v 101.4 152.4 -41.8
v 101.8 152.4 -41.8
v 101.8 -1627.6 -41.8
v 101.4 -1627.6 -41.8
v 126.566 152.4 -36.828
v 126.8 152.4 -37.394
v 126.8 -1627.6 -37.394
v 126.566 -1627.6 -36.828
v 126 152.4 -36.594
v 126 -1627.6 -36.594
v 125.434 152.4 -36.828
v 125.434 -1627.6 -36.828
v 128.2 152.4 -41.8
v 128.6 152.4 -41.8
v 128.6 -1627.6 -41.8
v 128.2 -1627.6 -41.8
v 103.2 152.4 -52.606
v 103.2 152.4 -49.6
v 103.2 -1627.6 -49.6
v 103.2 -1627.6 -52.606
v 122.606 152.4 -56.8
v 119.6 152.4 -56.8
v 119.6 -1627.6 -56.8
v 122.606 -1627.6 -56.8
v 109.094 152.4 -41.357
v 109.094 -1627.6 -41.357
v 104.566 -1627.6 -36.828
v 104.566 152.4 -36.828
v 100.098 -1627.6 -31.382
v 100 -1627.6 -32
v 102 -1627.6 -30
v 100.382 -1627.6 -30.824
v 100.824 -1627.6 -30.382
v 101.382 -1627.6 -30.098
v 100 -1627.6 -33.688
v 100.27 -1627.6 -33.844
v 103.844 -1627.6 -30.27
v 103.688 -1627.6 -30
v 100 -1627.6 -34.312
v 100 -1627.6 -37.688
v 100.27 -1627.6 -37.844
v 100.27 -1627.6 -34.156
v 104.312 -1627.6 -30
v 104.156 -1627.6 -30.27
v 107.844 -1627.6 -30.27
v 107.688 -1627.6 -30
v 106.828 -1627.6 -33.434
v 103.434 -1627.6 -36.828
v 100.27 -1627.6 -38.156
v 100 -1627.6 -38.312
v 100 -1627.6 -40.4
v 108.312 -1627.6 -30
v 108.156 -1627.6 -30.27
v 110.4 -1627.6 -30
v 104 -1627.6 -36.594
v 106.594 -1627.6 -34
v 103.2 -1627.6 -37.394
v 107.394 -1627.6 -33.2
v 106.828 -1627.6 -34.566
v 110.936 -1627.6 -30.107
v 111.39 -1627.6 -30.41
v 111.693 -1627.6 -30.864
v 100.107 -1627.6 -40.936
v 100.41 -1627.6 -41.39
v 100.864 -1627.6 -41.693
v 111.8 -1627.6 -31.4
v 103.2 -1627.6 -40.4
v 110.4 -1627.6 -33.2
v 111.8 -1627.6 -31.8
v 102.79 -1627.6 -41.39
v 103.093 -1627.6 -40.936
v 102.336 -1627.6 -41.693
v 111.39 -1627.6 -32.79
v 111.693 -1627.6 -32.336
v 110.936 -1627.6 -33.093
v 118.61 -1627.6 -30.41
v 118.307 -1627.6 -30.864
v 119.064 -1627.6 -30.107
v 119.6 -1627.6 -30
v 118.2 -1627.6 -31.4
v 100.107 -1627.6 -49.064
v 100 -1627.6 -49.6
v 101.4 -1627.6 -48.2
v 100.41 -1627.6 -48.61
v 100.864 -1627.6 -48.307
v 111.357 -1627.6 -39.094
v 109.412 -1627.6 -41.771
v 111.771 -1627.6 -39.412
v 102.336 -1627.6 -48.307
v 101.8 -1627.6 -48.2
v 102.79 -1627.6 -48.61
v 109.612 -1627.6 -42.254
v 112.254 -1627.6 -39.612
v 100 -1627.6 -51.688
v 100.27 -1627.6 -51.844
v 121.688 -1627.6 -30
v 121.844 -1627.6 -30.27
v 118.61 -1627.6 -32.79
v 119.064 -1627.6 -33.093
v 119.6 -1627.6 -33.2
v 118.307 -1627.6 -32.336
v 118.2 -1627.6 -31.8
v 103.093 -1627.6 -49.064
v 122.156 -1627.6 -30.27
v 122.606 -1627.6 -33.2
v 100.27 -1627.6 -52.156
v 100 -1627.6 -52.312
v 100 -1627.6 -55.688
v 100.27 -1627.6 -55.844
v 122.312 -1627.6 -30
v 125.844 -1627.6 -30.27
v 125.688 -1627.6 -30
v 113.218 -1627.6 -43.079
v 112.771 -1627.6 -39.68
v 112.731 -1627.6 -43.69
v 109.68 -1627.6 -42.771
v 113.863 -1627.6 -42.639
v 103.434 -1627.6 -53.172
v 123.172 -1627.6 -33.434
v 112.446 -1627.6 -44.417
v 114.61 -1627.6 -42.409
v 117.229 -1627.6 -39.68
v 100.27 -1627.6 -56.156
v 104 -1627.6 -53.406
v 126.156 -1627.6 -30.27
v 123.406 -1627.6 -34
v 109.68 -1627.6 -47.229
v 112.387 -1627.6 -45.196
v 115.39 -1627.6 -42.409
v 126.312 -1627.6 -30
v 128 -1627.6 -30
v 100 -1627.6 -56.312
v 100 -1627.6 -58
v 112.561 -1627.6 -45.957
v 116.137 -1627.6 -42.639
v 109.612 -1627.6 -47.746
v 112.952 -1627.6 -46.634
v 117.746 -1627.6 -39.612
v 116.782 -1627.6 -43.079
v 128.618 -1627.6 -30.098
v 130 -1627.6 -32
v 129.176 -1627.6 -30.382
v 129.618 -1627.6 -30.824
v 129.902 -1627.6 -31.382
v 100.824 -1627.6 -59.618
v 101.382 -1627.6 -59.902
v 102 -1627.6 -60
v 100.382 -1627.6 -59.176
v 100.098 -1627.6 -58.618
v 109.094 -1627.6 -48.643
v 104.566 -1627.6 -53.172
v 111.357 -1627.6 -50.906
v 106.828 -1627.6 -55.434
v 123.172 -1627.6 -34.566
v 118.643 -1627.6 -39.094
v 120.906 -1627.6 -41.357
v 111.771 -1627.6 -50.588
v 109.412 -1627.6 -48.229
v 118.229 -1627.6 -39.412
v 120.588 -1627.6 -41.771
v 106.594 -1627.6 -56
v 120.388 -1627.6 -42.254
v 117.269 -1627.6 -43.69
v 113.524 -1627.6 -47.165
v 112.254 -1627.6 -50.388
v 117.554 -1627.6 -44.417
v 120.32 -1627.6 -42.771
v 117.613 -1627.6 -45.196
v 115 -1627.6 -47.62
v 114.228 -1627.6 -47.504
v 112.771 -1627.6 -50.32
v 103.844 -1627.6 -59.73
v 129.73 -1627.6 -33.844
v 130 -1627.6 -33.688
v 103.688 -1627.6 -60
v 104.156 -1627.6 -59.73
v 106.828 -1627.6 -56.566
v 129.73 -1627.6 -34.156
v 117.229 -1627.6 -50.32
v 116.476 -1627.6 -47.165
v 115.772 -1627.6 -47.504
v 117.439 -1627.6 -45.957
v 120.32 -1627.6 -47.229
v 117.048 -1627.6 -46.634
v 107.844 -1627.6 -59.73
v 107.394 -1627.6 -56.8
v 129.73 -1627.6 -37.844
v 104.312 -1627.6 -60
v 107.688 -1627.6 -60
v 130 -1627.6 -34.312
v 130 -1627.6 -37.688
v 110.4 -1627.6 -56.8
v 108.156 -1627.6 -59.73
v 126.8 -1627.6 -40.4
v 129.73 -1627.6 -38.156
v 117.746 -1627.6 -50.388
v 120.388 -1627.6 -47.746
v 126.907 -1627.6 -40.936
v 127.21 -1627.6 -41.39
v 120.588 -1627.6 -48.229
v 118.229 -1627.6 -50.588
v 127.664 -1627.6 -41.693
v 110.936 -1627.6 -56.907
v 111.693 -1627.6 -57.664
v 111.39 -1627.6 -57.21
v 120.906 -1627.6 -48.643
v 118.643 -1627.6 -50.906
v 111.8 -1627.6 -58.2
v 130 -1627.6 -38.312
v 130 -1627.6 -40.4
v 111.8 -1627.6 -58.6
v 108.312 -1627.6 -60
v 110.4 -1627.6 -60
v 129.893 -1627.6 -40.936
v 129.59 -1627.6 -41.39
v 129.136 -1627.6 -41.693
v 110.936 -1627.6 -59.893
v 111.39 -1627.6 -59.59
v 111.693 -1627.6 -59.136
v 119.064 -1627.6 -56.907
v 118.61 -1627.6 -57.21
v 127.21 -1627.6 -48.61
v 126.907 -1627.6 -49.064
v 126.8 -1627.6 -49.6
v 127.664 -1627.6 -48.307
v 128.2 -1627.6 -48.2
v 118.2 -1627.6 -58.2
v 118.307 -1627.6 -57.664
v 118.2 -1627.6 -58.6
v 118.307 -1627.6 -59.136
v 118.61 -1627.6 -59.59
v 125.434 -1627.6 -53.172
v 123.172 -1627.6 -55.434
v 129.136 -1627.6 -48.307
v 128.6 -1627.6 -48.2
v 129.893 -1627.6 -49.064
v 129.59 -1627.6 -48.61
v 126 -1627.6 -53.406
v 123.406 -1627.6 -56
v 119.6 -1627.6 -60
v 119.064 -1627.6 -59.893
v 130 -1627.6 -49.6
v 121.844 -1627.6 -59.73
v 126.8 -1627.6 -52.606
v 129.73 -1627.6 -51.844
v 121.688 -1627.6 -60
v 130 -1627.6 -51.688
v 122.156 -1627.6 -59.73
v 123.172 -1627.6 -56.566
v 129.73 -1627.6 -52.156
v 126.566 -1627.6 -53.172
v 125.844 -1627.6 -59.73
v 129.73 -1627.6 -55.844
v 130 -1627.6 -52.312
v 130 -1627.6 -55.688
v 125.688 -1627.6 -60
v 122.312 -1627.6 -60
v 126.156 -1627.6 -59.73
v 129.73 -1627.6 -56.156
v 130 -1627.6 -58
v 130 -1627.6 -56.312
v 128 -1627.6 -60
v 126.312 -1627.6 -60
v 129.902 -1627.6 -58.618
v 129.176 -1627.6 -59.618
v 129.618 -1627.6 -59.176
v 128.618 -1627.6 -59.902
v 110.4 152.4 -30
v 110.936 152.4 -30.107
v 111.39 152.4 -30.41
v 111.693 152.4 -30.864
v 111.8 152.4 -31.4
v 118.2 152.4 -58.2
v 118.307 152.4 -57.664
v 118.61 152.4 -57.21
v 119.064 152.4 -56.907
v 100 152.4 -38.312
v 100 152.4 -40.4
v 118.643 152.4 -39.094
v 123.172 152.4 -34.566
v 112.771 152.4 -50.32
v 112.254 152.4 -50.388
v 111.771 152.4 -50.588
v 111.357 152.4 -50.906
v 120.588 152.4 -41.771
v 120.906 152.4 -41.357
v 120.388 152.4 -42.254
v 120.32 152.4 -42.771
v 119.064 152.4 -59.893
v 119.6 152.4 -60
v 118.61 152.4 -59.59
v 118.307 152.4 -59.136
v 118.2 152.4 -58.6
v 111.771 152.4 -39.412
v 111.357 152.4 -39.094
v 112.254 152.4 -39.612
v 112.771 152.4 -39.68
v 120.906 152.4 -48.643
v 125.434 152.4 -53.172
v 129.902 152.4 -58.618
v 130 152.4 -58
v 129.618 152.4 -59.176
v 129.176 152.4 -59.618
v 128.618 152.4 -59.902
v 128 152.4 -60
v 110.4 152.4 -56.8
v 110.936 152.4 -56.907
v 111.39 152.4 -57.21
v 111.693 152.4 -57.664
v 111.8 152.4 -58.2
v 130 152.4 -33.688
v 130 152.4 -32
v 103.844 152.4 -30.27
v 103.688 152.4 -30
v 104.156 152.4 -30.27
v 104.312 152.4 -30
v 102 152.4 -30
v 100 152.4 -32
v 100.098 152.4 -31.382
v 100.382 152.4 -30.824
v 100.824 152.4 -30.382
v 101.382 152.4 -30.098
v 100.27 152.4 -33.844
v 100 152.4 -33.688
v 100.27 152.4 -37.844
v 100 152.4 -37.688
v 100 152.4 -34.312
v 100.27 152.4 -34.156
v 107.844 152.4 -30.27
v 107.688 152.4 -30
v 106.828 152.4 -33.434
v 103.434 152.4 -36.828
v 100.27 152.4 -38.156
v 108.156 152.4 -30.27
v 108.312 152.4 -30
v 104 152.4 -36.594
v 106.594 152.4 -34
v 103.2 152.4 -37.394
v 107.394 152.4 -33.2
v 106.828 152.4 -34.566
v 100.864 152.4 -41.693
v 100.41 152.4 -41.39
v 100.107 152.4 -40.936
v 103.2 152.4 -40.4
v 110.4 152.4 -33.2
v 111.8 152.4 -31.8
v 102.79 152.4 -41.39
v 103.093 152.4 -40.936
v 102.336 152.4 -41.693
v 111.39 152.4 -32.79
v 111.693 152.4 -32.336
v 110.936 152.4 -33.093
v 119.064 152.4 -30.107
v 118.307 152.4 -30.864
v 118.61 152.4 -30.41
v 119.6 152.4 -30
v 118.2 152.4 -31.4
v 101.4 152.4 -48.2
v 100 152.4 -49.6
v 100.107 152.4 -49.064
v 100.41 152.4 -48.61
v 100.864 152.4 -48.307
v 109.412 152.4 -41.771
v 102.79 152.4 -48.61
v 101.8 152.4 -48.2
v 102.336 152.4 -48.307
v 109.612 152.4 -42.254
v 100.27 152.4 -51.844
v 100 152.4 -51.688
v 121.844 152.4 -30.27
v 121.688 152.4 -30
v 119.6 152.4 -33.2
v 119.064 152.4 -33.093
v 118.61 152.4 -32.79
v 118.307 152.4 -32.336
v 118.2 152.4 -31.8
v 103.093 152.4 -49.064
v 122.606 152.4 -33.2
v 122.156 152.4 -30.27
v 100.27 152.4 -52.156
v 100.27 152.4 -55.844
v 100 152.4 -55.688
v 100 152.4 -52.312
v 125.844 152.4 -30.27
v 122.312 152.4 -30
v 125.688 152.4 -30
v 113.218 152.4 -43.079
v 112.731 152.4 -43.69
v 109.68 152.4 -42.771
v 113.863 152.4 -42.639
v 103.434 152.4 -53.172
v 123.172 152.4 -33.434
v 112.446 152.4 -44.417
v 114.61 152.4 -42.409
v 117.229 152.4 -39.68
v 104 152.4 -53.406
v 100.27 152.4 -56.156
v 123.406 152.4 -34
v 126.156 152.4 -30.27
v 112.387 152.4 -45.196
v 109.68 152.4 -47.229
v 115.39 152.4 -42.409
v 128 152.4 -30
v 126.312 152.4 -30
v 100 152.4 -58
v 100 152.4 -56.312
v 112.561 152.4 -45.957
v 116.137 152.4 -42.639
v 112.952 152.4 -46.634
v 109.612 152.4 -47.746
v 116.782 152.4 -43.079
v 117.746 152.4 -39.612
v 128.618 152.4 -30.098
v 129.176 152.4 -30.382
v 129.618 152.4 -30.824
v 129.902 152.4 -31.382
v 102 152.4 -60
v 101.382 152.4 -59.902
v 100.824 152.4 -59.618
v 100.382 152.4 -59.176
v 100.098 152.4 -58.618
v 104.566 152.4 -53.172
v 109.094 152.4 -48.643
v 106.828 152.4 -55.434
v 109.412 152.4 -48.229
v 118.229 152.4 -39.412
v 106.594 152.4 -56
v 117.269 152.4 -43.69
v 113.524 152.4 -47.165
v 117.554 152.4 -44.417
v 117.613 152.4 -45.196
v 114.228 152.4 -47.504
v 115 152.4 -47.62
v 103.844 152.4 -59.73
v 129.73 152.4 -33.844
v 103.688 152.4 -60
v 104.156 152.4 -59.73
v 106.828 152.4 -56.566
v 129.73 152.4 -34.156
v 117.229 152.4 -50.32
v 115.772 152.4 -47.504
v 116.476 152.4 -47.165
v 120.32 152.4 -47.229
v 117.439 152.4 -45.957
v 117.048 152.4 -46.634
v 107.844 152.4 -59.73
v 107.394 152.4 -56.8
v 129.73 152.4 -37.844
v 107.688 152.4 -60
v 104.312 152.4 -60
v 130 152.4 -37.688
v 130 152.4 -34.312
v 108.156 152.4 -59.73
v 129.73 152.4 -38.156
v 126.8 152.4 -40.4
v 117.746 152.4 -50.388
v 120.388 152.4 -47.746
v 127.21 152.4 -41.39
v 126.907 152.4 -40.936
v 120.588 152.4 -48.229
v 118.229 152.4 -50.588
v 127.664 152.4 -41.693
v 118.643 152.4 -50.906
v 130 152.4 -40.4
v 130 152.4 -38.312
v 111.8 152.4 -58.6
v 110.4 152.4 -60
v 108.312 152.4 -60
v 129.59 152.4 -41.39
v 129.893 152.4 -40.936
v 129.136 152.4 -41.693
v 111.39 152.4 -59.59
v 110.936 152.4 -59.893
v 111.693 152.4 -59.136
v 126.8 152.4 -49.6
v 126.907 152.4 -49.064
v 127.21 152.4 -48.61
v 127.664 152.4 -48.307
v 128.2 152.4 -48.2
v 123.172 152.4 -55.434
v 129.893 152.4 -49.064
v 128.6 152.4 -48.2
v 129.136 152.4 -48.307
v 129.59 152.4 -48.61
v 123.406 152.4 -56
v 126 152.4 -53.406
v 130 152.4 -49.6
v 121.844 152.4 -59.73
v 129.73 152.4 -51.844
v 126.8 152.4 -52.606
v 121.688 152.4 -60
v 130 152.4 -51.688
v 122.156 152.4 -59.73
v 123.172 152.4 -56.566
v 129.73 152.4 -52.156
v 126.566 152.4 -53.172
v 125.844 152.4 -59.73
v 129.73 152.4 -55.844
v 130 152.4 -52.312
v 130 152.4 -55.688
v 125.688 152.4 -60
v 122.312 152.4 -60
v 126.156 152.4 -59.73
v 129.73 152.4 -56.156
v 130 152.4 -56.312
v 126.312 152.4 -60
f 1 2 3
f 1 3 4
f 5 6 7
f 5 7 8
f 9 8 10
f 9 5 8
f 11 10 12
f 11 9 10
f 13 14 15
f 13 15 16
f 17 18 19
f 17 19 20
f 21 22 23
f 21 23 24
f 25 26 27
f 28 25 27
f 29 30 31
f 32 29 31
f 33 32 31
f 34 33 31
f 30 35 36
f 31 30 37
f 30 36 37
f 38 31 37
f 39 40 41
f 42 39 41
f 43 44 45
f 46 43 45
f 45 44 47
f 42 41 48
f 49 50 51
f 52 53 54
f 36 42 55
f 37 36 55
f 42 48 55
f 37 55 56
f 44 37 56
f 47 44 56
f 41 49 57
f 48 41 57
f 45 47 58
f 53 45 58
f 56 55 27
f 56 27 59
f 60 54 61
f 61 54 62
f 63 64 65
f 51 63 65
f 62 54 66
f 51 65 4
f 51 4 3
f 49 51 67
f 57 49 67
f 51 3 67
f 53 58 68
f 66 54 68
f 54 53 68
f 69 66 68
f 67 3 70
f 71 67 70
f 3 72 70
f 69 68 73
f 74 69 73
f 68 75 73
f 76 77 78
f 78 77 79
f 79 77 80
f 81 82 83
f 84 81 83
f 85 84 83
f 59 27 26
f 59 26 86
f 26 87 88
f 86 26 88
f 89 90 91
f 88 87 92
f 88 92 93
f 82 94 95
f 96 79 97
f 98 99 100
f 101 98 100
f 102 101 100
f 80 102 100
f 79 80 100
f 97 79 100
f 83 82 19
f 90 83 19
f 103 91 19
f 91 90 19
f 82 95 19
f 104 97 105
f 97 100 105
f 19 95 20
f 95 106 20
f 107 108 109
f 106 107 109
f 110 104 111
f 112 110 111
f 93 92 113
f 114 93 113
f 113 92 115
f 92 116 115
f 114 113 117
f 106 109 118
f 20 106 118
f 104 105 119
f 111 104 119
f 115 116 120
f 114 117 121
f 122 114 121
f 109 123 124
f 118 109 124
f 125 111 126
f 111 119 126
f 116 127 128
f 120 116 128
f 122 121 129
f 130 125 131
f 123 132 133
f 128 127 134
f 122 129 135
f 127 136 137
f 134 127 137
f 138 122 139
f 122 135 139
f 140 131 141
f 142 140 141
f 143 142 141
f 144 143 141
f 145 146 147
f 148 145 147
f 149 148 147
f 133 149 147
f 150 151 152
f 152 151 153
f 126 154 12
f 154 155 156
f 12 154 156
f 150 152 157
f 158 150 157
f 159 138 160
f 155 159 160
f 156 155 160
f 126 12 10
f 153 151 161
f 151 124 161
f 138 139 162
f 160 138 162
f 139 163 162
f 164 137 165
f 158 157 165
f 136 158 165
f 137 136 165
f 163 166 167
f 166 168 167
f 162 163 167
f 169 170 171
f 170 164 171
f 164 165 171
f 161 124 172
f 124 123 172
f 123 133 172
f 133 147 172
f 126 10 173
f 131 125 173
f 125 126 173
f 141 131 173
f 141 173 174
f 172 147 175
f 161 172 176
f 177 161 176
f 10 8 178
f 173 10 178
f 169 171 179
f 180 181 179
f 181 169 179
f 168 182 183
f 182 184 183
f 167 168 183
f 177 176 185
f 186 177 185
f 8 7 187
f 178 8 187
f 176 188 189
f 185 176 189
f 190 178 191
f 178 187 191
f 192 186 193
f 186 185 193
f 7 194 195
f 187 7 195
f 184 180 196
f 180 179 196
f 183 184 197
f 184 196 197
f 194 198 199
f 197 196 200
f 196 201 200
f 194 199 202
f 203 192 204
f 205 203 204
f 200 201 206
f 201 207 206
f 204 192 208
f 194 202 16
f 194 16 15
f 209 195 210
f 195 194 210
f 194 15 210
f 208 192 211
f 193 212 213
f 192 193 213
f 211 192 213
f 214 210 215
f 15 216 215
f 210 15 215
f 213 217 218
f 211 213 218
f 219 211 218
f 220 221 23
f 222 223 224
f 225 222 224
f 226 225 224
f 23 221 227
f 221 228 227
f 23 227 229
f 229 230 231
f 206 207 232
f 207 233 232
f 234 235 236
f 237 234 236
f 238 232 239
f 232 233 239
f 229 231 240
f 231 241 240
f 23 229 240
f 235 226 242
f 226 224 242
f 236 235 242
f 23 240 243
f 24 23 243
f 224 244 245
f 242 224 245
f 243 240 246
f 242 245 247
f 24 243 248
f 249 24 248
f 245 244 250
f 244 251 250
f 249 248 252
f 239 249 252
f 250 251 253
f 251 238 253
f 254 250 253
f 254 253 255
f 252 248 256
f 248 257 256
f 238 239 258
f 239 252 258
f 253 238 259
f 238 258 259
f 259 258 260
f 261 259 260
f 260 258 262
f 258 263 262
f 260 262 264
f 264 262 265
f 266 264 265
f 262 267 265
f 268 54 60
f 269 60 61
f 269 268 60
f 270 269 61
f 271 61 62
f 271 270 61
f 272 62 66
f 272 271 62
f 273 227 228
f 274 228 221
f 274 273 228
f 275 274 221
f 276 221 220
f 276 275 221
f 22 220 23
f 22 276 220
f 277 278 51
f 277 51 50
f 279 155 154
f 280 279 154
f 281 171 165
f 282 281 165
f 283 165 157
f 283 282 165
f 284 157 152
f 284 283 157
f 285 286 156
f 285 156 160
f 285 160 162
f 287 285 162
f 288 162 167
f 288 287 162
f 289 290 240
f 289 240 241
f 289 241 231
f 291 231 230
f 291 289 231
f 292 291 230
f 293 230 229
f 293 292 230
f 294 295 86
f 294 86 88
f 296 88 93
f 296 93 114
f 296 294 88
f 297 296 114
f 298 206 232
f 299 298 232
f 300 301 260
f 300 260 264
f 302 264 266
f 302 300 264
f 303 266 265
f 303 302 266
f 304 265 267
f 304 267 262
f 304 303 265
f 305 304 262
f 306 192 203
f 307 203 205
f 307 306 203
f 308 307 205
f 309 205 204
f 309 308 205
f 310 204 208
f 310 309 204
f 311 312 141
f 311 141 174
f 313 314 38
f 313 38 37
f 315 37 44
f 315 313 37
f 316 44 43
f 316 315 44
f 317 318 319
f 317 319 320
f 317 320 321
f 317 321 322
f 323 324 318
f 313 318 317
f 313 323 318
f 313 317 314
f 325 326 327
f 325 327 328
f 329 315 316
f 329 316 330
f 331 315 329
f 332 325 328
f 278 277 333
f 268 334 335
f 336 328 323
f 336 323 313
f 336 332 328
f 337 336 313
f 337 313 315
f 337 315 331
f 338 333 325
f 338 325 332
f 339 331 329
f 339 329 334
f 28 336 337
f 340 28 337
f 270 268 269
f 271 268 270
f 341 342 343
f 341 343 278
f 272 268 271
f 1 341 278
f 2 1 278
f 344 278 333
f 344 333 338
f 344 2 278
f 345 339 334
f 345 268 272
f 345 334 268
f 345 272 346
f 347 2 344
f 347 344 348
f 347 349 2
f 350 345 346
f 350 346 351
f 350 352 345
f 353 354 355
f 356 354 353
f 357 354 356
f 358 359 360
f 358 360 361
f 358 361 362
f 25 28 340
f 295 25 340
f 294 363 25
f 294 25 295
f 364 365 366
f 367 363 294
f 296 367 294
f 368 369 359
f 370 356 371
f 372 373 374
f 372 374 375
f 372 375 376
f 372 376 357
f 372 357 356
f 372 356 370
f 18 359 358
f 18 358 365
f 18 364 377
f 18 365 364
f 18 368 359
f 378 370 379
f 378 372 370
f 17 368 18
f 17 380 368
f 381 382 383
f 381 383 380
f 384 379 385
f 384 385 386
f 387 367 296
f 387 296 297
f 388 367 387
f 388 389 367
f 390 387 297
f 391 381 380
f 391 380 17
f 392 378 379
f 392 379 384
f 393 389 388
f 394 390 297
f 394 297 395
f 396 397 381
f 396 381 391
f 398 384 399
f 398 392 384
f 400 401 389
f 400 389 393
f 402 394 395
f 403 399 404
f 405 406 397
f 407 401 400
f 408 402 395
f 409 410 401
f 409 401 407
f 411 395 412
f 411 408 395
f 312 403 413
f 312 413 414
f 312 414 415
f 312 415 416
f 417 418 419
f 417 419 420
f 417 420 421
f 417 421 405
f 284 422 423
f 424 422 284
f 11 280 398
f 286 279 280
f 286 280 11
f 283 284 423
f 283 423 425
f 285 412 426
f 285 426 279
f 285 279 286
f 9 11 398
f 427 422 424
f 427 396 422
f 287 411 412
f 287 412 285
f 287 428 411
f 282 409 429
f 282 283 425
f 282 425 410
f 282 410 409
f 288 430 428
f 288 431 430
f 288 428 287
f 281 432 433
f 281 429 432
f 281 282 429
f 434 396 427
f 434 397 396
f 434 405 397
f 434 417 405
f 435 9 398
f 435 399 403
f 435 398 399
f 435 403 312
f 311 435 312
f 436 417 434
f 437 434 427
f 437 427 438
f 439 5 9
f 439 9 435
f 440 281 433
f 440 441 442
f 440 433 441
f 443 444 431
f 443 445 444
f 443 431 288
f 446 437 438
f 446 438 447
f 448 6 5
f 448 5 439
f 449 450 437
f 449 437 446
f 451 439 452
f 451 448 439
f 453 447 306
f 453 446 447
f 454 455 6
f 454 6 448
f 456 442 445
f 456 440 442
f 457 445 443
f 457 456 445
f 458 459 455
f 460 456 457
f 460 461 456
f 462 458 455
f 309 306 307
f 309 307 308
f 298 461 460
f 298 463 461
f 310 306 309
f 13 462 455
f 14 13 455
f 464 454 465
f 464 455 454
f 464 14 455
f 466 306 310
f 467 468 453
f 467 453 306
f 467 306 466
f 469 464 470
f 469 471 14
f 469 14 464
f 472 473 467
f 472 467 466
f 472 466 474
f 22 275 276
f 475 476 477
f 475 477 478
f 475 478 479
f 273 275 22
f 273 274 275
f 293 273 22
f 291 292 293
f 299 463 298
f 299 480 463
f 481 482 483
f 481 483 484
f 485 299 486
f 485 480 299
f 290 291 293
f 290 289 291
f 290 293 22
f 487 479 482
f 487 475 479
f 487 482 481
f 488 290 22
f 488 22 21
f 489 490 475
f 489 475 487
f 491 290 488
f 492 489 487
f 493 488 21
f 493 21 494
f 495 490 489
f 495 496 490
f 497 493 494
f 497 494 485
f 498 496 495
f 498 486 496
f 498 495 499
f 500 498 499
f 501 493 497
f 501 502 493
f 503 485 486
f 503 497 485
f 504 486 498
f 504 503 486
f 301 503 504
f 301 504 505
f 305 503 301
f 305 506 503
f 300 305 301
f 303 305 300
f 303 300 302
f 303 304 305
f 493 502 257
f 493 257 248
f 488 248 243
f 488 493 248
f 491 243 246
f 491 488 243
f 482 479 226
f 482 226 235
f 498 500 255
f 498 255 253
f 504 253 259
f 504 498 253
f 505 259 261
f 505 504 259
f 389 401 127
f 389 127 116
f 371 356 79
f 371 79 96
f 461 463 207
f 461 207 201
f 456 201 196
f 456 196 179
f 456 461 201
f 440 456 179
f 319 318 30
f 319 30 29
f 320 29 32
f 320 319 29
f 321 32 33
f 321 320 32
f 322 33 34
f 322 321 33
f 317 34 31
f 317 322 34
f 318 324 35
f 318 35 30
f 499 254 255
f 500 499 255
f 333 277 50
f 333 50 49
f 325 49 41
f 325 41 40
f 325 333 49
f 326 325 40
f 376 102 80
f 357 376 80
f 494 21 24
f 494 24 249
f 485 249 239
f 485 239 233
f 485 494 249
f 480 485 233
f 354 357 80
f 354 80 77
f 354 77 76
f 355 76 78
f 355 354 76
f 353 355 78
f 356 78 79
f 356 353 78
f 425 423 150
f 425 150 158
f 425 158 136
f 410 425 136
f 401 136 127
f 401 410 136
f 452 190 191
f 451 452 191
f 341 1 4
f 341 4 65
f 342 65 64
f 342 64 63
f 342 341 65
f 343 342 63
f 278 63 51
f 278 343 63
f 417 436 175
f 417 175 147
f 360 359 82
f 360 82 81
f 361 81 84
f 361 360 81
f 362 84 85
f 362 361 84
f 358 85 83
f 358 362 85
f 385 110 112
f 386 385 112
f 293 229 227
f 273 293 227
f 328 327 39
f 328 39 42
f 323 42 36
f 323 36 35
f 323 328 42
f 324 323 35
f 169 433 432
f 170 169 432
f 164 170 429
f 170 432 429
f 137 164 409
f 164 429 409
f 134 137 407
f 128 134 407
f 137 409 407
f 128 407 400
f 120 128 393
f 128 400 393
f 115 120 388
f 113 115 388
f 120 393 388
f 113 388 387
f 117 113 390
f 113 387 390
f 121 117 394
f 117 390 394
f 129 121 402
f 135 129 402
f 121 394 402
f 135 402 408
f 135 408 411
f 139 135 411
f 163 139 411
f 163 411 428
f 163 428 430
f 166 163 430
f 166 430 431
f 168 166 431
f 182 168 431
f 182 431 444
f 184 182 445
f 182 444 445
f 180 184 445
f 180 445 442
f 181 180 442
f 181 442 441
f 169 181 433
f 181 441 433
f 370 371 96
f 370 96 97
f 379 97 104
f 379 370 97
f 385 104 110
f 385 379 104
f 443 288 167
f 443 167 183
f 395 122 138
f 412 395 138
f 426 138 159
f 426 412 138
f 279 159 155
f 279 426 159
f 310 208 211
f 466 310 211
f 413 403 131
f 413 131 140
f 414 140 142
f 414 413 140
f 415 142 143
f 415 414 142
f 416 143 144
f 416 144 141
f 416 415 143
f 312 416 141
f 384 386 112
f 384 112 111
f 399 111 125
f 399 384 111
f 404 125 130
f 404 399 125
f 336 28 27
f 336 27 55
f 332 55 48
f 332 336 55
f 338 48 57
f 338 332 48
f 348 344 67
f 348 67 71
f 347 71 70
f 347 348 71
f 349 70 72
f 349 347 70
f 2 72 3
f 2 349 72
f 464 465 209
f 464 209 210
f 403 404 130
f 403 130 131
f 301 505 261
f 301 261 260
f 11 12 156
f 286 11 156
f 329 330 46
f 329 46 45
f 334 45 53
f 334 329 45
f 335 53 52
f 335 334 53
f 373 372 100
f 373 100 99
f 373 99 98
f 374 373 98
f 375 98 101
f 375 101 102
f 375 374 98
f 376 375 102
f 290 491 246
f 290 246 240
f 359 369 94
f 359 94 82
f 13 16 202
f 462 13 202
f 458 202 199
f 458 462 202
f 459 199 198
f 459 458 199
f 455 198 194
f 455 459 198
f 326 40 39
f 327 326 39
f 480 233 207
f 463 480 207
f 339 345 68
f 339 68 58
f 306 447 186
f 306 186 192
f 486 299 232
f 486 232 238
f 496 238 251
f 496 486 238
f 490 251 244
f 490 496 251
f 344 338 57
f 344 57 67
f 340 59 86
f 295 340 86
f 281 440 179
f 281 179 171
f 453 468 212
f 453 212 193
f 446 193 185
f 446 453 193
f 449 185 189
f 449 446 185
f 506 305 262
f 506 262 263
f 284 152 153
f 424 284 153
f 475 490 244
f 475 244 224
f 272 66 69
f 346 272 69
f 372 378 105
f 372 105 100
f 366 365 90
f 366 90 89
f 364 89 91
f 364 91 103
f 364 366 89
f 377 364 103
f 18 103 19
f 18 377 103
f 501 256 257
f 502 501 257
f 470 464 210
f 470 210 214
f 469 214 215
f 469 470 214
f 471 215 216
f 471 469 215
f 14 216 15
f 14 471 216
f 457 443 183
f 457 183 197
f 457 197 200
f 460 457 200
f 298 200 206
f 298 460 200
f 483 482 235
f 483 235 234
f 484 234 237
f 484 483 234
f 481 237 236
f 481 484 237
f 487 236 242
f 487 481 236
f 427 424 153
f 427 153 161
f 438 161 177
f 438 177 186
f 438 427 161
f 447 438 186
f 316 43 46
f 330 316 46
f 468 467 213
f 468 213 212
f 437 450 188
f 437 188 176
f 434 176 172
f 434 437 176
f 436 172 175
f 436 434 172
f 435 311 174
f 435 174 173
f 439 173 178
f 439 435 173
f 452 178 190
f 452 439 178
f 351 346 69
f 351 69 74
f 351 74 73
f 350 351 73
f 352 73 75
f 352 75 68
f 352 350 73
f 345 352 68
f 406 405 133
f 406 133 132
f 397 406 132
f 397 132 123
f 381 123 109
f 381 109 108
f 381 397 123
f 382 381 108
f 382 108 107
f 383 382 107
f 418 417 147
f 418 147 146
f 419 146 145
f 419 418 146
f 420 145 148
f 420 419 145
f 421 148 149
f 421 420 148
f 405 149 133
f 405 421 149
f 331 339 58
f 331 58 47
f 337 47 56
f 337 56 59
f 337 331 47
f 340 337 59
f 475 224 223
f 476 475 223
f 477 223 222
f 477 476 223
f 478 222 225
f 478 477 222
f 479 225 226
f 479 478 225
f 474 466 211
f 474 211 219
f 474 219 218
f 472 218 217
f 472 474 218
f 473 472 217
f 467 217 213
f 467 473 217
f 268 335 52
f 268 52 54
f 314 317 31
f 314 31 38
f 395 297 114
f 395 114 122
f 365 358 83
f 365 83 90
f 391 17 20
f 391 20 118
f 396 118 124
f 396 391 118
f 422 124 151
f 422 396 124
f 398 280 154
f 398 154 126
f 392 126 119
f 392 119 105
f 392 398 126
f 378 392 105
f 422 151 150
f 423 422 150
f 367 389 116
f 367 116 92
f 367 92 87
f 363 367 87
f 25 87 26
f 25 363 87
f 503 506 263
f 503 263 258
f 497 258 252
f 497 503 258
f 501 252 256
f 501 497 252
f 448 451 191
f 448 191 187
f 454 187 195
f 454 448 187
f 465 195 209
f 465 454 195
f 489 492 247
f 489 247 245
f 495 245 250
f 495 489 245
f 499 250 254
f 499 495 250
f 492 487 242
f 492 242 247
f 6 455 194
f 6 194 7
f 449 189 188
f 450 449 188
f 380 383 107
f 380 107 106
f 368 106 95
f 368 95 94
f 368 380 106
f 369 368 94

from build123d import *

# Parameters (mm, degrees)
SCHIZZO1_R                   = 2.62
ESTRUSIONE_ESTRUSIONE1_DEPTH = 1780


with BuildPart() as part:
    # Schizzo1 → Estrusione-Estrusione1 (new body)
    with BuildSketch(Plane(origin=(0, 152.4, 0), x_dir=(1, 0, 0), z_dir=(0, 1, 0))):
        with BuildLine():
            Line((130, 32), (130, 33.687990441))
            ThreePointArc((130, 33.687990441), (129.687990441, 34), (130, 34.312009559))
            Line((130, 34.312009559), (130, 37.687990441))
            ThreePointArc((130, 37.687990441), (129.687990441, 38), (130, 38.312009559))
            Line((130, 38.312009559), (130, 40.4))
            ThreePointArc((130, 40.4), (129.589949494, 41.389949494), (128.6, 41.8))
            Line((128.6, 41.8), (128.2, 41.8))
            ThreePointArc((128.2, 41.8), (127.210050506, 41.389949494), (126.8, 40.4))
            Line((126.8, 40.4), (126.8, 37.39411255))
            ThreePointArc((126.8, 37.39411255), (126.306146746, 36.655008924), (125.434314575, 36.828427125))
            Line((125.434314575, 36.828427125), (120.905786438, 41.356955262))
            ThreePointArc((120.905786438, 41.356955262), (120.472240935, 42.00580196), (120.32, 42.771168825))
            Line((120.32, 42.771168825), (120.32, 47.228831175))
            ThreePointArc((120.32, 47.228831175), (120.472240935, 47.99419804), (120.905786438, 48.643044738))
            Line((120.905786438, 48.643044738), (125.434314575, 53.171572875))
            ThreePointArc((125.434314575, 53.171572875), (126.306146746, 53.344991076), (126.8, 52.60588745))
            Line((126.8, 52.60588745), (126.8, 49.6))
            ThreePointArc((126.8, 49.6), (127.210050506, 48.610050506), (128.2, 48.2))
            Line((128.2, 48.2), (128.6, 48.2))
            ThreePointArc((128.6, 48.2), (129.589949494, 48.610050506), (130, 49.6))
            Line((130, 49.6), (130, 51.687990441))
            ThreePointArc((130, 51.687990441), (129.687990441, 52), (130, 52.312009559))
            Line((130, 52.312009559), (130, 55.687990441))
            ThreePointArc((130, 55.687990441), (129.687990441, 56), (130, 56.312009559))
            Line((130, 56.312009559), (130, 58))
            ThreePointArc((130, 58), (129.414213562, 59.414213562), (128, 60))
            Line((128, 60), (126.312009559, 60))
            ThreePointArc((126.312009559, 60), (126, 59.687990441), (125.687990441, 60))
            Line((125.687990441, 60), (122.312009559, 60))
            ThreePointArc((122.312009559, 60), (122, 59.687990441), (121.687990441, 60))
            Line((121.687990441, 60), (119.6, 60))
            ThreePointArc((119.6, 60), (118.610050506, 59.589949494), (118.2, 58.6))
            Line((118.2, 58.6), (118.2, 58.2))
            ThreePointArc((118.2, 58.2), (118.610050506, 57.210050506), (119.6, 56.8))
            Line((119.6, 56.8), (122.60588745, 56.8))
            ThreePointArc((122.60588745, 56.8), (123.344991076, 56.306146746), (123.171572875, 55.434314575))
            Line((123.171572875, 55.434314575), (118.643044738, 50.905786438))
            ThreePointArc((118.643044738, 50.905786438), (117.99419804, 50.472240935), (117.228831175, 50.32))
            Line((117.228831175, 50.32), (112.771168825, 50.32))
            ThreePointArc((112.771168825, 50.32), (112.00580196, 50.472240935), (111.356955262, 50.905786438))
            Line((111.356955262, 50.905786438), (106.828427125, 55.434314575))
            ThreePointArc((106.828427125, 55.434314575), (106.655008924, 56.306146746), (107.39411255, 56.8))
            Line((107.39411255, 56.8), (110.4, 56.8))
            ThreePointArc((110.4, 56.8), (111.389949494, 57.210050506), (111.8, 58.2))
            Line((111.8, 58.2), (111.8, 58.6))
            ThreePointArc((111.8, 58.6), (111.389949494, 59.589949494), (110.4, 60))
            Line((110.4, 60), (108.312009559, 60))
            ThreePointArc((108.312009559, 60), (108, 59.687990441), (107.687990441, 60))
            Line((107.687990441, 60), (104.312009559, 60))
            ThreePointArc((104.312009559, 60), (104, 59.687990441), (103.687990441, 60))
            Line((103.687990441, 60), (102, 60))
            ThreePointArc((102, 60), (100.585786438, 59.414213562), (100, 58))
            Line((100, 58), (100, 56.312009559))
            ThreePointArc((100, 56.312009559), (100.312009559, 56), (100, 55.687990441))
            Line((100, 55.687990441), (100, 52.312009559))
            ThreePointArc((100, 52.312009559), (100.312009559, 52), (100, 51.687990441))
            Line((100, 51.687990441), (100, 49.6))
            ThreePointArc((100, 49.6), (100.410050506, 48.610050506), (101.4, 48.2))
            Line((101.4, 48.2), (101.8, 48.2))
            ThreePointArc((101.8, 48.2), (102.789949494, 48.610050506), (103.2, 49.6))
            Line((103.2, 49.6), (103.2, 52.60588745))
            ThreePointArc((103.2, 52.60588745), (103.693853254, 53.344991076), (104.565685425, 53.171572875))
            Line((104.565685425, 53.171572875), (109.094213562, 48.643044738))
            ThreePointArc((109.094213562, 48.643044738), (109.527759065, 47.99419804), (109.68, 47.228831175))
            Line((109.68, 47.228831175), (109.68, 42.771168825))
            ThreePointArc((109.68, 42.771168825), (109.527759065, 42.00580196), (109.094213562, 41.356955262))
            Line((109.094213562, 41.356955262), (104.565685425, 36.828427125))
            ThreePointArc((104.565685425, 36.828427125), (103.693853254, 36.655008924), (103.2, 37.39411255))
            Line((103.2, 37.39411255), (103.2, 40.4))
            ThreePointArc((103.2, 40.4), (102.789949494, 41.389949494), (101.8, 41.8))
            Line((101.8, 41.8), (101.4, 41.8))
            ThreePointArc((101.4, 41.8), (100.410050506, 41.389949494), (100, 40.4))
            Line((100, 40.4), (100, 38.312009559))
            ThreePointArc((100, 38.312009559), (100.312009559, 38), (100, 37.687990441))
            Line((100, 37.687990441), (100, 34.312009559))
            ThreePointArc((100, 34.312009559), (100.312009559, 34), (100, 33.687990441))
            Line((100, 33.687990441), (100, 32))
            ThreePointArc((100, 32), (100.585786438, 30.585786438), (102, 30))
            Line((102, 30), (103.687990441, 30))
            ThreePointArc((103.687990441, 30), (104, 30.312009559), (104.312009559, 30))
            Line((104.312009559, 30), (107.687990441, 30))
            ThreePointArc((107.687990441, 30), (108, 30.312009559), (108.312009559, 30))
            Line((108.312009559, 30), (110.4, 30))
            ThreePointArc((110.4, 30), (111.389949494, 30.410050506), (111.8, 31.4))
            Line((111.8, 31.4), (111.8, 31.8))
            ThreePointArc((111.8, 31.8), (111.389949494, 32.789949494), (110.4, 33.2))
            Line((110.4, 33.2), (107.39411255, 33.2))
            ThreePointArc((107.39411255, 33.2), (106.655008924, 33.693853254), (106.828427125, 34.565685425))
            Line((106.828427125, 34.565685425), (111.356955262, 39.094213562))
            ThreePointArc((111.356955262, 39.094213562), (112.00580196, 39.527759065), (112.771168825, 39.68))
            Line((112.771168825, 39.68), (117.228831175, 39.68))
            ThreePointArc((117.228831175, 39.68), (117.99419804, 39.527759065), (118.643044738, 39.094213562))
            Line((118.643044738, 39.094213562), (123.171572875, 34.565685425))
            ThreePointArc((123.171572875, 34.565685425), (123.344991076, 33.693853254), (122.60588745, 33.2))
            Line((122.60588745, 33.2), (119.6, 33.2))
            ThreePointArc((119.6, 33.2), (118.610050506, 32.789949494), (118.2, 31.8))
            Line((118.2, 31.8), (118.2, 31.4))
            ThreePointArc((118.2, 31.4), (118.610050506, 30.410050506), (119.6, 30))
            Line((119.6, 30), (121.687990441, 30))
            ThreePointArc((121.687990441, 30), (122, 30.312009559), (122.312009559, 30))
            Line((122.312009559, 30), (125.687990441, 30))
            ThreePointArc((125.687990441, 30), (126, 30.312009559), (126.312009559, 30))
            Line((126.312009559, 30), (128, 30))
            ThreePointArc((128, 30), (129.414213562, 30.585786438), (130, 32))
        make_face()
        with Locations(Location((115, 45, 0), (0, 0, 90))):
            Circle(SCHIZZO1_R, mode=Mode.SUBTRACT)
    extrude(amount=-ESTRUSIONE_ESTRUSIONE1_DEPTH)


solid = part.part
